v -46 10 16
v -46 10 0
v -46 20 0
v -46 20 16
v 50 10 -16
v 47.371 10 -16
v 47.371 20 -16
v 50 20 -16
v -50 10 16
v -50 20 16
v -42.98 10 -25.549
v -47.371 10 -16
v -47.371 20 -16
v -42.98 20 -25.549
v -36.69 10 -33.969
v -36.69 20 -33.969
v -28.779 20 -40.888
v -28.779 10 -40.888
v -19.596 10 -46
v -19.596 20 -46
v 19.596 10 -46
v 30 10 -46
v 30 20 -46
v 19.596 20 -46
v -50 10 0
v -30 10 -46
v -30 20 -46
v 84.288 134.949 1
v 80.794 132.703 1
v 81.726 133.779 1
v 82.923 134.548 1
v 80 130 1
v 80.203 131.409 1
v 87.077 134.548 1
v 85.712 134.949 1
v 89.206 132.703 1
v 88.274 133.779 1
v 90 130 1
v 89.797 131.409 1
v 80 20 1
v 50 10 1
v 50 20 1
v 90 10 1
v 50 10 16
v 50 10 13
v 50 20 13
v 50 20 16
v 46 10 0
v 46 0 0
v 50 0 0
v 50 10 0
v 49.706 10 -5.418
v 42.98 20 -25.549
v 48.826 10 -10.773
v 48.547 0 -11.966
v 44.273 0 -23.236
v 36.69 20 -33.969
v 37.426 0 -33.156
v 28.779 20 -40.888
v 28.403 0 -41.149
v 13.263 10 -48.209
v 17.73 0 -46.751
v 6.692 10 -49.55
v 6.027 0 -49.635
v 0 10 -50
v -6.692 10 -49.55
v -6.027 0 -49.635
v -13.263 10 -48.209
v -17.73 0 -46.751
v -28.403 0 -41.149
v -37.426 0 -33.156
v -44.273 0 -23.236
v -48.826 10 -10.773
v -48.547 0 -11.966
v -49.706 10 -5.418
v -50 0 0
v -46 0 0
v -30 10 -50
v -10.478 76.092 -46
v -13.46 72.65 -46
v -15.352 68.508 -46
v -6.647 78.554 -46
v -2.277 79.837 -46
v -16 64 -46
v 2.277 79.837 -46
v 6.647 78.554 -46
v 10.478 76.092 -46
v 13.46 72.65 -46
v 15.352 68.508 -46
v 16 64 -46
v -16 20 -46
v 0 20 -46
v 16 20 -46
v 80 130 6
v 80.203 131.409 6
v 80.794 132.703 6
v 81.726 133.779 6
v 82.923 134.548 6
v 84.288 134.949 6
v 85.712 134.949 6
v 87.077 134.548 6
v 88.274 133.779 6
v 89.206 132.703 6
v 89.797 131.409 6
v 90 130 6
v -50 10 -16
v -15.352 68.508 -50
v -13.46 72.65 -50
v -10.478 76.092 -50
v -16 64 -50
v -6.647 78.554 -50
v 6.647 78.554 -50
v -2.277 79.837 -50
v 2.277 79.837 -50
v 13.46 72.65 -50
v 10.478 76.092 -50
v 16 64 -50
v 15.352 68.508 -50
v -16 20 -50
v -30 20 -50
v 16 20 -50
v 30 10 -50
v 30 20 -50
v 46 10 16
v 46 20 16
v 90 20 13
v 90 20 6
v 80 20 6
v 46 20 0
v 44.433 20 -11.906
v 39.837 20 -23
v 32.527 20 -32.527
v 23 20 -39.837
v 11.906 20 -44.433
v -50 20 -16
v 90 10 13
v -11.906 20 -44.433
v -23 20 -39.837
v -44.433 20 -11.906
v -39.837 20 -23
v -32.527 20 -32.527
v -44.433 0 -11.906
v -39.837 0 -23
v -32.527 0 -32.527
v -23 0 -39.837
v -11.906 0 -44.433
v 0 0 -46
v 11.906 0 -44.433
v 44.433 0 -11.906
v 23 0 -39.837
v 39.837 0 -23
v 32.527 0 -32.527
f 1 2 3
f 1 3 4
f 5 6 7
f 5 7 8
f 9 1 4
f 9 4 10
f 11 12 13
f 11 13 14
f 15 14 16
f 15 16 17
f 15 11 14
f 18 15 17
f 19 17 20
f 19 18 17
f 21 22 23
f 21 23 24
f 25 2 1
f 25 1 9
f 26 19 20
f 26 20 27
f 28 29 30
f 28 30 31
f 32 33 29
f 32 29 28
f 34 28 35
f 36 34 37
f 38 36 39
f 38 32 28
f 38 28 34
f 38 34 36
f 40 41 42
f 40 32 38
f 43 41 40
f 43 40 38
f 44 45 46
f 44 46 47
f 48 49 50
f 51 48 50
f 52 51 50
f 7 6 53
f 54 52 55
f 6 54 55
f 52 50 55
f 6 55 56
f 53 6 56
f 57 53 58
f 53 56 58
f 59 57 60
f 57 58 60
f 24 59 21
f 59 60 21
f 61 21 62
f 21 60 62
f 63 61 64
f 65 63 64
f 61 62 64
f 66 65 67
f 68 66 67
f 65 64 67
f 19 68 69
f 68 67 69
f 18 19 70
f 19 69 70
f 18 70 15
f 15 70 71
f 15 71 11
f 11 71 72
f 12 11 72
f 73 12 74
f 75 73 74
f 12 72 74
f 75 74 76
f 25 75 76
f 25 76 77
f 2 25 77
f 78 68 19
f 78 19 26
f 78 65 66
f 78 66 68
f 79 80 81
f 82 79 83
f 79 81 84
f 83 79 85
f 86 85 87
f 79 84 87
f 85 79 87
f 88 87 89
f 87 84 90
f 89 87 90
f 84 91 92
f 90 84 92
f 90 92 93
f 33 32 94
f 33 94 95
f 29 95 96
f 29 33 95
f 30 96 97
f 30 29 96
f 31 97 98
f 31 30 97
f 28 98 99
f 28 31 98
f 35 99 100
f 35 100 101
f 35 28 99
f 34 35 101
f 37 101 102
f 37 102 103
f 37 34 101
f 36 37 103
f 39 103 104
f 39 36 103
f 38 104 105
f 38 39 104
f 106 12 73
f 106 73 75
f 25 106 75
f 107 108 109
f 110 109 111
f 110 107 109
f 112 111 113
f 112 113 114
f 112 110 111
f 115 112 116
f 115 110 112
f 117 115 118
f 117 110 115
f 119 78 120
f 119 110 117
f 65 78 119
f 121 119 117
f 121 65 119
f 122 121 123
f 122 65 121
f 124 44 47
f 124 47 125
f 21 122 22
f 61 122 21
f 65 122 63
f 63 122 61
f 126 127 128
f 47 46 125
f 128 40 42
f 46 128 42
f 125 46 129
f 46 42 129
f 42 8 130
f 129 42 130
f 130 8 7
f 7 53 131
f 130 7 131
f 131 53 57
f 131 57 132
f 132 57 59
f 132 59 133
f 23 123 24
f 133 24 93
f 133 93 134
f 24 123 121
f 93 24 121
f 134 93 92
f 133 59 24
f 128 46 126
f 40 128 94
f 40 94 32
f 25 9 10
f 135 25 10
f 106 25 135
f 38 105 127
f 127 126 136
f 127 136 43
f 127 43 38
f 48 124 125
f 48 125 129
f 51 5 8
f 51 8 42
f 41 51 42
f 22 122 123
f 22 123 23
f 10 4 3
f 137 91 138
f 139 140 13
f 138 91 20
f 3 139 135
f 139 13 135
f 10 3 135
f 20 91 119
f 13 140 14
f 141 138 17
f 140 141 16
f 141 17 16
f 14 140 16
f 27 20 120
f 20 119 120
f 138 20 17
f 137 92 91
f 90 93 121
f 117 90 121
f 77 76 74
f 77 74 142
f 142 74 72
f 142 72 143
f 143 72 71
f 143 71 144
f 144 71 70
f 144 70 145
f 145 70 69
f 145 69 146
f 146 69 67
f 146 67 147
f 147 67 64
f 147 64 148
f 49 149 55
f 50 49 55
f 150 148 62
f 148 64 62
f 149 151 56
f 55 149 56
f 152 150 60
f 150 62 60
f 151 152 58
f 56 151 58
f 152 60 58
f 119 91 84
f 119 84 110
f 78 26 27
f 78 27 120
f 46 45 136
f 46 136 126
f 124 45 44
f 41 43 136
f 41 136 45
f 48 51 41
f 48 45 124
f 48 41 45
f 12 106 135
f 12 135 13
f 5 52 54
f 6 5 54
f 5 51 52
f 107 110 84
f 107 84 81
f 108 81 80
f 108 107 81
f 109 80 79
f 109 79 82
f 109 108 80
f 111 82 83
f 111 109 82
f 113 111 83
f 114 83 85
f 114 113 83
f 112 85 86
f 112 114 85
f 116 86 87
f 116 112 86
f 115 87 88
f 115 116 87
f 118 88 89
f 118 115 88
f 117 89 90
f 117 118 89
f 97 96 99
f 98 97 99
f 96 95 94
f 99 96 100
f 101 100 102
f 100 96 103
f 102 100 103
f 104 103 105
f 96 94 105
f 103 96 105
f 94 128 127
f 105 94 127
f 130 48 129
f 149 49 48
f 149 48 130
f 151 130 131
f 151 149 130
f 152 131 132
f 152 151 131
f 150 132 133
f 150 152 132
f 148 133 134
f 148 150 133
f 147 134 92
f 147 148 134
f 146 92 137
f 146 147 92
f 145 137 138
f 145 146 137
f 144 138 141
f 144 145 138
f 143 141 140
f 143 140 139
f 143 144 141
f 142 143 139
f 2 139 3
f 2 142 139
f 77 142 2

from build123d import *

# Parameters (mm, degrees)
EXTRUDE_1_DEPTH     = 10
EXTRUDE_2_DEPTH     = 10
SKETCH_4_W          = 32
SKETCH_4_H          = 4
EXTRUDE_3_DEPTH     = 60
CUT_EXTRUDE_1_DEPTH = 30
SKETCH_6_W          = 12
SKETCH_6_H          = 10
EXTRUDE_4_DEPTH     = 40
SKETCH_7_W          = 10
SKETCH_7_H          = 5
EXTRUDE_5_DEPTH     = 110
SKETCH_8_R          = 5
EXTRUDE_6_DEPTH     = 5


with BuildPart() as part:
    # 草图1 → 凸台-拉伸1 (new body)
    with BuildSketch(Plane(origin=(0, 0, 0), x_dir=(1, 0, 0), z_dir=(0, 1, 0))):
        with BuildLine():
            Line((-50, 0), (-46, 0))
            ThreePointArc((-46, 0), (0, 46), (46, 0))
            Line((46, 0), (50, 0))
            ThreePointArc((50, 0), (0, 50), (-50, 0))
        make_face()
    extrude(amount=EXTRUDE_1_DEPTH)

    # 草图3 → 凸台-拉伸2 (add)
    with BuildSketch(Plane(origin=(0, 10, 0), x_dir=(1, 0, 0), z_dir=(0, 1, 0))):
        with BuildLine():
            Line((-50, 16), (-47.370877129, 16))
            ThreePointArc((-47.370877129, 16), (-36.689752119, 33.968545589), (-19.595917942, 46))
            Line((-19.595917942, 46), (-30, 46))
            Line((-30, 46), (-30, 50))
            Line((-30, 50), (30, 50))
            Line((30, 50), (30, 46))
            Line((30, 46), (19.595917942, 46))
            ThreePointArc((19.595917942, 46), (36.689752119, 33.968545589), (47.370877129, 16))
            Line((47.370877129, 16), (50, 16))
            Line((50, 16), (50, -16))
            Line((50, -16), (46, -16))
            Line((46, -16), (46, 0))
            ThreePointArc((46, 0), (0, 46), (-46, 0))
            Line((-46, 0), (-46, -16))
            Line((-46, -16), (-50, -16))
            Line((-50, -16), (-50, 16))
        make_face()
    extrude(amount=EXTRUDE_2_DEPTH)

    # 草图4 → 凸台-拉伸3 (add)
    with BuildSketch(Plane(origin=(0, 20, 0), x_dir=(1, 0, 0), z_dir=(0, 1, 0))):
        with Locations((0, 48)):
            Rectangle(SKETCH_4_W, SKETCH_4_H)
    extrude(amount=EXTRUDE_3_DEPTH)

    # 草图5 → 切除-拉伸1 (cut)
    with BuildSketch(Plane(origin=(0, 0, -50), x_dir=(-1, 0, 0), z_dir=(0, 0, -1))):
        with BuildLine():
            Line((-16, 64), (-16, 97.905328476))
            Line((-16, 97.905328476), (16, 97.905328476))
            Line((16, 97.905328476), (16, 64))
            ThreePointArc((16, 64), (0, 80), (-16, 64))
        make_face()
    extrude(amount=-CUT_EXTRUDE_1_DEPTH, mode=Mode.SUBTRACT)

    # 草图6 → 凸台-拉伸4 (add)
    with BuildSketch(Plane(origin=(50, 0, 0), x_dir=(0, 0, -1), z_dir=(1, 0, 0))):
        with Locations((-7, 15)):
            Rectangle(SKETCH_6_W, SKETCH_6_H)
    extrude(amount=EXTRUDE_4_DEPTH)

    # 草图7 → 凸台-拉伸5 (add)
    with BuildSketch(Plane(origin=(0, 20, 0), x_dir=(1, 0, 0), z_dir=(0, 1, 0))):
        with Locations((85, -3.5)):
            Rectangle(SKETCH_7_W, SKETCH_7_H)
    extrude(amount=EXTRUDE_5_DEPTH)

    # 草图8 → 凸台-拉伸6 (add)
    with BuildSketch(Plane(origin=(0, 0, 1), x_dir=(-1, 0, 0), z_dir=(0, 0, -1))):
        with Locations((-85, 130)):
            Circle(SKETCH_8_R)
    extrude(amount=-EXTRUDE_6_DEPTH)


solid = part.part
